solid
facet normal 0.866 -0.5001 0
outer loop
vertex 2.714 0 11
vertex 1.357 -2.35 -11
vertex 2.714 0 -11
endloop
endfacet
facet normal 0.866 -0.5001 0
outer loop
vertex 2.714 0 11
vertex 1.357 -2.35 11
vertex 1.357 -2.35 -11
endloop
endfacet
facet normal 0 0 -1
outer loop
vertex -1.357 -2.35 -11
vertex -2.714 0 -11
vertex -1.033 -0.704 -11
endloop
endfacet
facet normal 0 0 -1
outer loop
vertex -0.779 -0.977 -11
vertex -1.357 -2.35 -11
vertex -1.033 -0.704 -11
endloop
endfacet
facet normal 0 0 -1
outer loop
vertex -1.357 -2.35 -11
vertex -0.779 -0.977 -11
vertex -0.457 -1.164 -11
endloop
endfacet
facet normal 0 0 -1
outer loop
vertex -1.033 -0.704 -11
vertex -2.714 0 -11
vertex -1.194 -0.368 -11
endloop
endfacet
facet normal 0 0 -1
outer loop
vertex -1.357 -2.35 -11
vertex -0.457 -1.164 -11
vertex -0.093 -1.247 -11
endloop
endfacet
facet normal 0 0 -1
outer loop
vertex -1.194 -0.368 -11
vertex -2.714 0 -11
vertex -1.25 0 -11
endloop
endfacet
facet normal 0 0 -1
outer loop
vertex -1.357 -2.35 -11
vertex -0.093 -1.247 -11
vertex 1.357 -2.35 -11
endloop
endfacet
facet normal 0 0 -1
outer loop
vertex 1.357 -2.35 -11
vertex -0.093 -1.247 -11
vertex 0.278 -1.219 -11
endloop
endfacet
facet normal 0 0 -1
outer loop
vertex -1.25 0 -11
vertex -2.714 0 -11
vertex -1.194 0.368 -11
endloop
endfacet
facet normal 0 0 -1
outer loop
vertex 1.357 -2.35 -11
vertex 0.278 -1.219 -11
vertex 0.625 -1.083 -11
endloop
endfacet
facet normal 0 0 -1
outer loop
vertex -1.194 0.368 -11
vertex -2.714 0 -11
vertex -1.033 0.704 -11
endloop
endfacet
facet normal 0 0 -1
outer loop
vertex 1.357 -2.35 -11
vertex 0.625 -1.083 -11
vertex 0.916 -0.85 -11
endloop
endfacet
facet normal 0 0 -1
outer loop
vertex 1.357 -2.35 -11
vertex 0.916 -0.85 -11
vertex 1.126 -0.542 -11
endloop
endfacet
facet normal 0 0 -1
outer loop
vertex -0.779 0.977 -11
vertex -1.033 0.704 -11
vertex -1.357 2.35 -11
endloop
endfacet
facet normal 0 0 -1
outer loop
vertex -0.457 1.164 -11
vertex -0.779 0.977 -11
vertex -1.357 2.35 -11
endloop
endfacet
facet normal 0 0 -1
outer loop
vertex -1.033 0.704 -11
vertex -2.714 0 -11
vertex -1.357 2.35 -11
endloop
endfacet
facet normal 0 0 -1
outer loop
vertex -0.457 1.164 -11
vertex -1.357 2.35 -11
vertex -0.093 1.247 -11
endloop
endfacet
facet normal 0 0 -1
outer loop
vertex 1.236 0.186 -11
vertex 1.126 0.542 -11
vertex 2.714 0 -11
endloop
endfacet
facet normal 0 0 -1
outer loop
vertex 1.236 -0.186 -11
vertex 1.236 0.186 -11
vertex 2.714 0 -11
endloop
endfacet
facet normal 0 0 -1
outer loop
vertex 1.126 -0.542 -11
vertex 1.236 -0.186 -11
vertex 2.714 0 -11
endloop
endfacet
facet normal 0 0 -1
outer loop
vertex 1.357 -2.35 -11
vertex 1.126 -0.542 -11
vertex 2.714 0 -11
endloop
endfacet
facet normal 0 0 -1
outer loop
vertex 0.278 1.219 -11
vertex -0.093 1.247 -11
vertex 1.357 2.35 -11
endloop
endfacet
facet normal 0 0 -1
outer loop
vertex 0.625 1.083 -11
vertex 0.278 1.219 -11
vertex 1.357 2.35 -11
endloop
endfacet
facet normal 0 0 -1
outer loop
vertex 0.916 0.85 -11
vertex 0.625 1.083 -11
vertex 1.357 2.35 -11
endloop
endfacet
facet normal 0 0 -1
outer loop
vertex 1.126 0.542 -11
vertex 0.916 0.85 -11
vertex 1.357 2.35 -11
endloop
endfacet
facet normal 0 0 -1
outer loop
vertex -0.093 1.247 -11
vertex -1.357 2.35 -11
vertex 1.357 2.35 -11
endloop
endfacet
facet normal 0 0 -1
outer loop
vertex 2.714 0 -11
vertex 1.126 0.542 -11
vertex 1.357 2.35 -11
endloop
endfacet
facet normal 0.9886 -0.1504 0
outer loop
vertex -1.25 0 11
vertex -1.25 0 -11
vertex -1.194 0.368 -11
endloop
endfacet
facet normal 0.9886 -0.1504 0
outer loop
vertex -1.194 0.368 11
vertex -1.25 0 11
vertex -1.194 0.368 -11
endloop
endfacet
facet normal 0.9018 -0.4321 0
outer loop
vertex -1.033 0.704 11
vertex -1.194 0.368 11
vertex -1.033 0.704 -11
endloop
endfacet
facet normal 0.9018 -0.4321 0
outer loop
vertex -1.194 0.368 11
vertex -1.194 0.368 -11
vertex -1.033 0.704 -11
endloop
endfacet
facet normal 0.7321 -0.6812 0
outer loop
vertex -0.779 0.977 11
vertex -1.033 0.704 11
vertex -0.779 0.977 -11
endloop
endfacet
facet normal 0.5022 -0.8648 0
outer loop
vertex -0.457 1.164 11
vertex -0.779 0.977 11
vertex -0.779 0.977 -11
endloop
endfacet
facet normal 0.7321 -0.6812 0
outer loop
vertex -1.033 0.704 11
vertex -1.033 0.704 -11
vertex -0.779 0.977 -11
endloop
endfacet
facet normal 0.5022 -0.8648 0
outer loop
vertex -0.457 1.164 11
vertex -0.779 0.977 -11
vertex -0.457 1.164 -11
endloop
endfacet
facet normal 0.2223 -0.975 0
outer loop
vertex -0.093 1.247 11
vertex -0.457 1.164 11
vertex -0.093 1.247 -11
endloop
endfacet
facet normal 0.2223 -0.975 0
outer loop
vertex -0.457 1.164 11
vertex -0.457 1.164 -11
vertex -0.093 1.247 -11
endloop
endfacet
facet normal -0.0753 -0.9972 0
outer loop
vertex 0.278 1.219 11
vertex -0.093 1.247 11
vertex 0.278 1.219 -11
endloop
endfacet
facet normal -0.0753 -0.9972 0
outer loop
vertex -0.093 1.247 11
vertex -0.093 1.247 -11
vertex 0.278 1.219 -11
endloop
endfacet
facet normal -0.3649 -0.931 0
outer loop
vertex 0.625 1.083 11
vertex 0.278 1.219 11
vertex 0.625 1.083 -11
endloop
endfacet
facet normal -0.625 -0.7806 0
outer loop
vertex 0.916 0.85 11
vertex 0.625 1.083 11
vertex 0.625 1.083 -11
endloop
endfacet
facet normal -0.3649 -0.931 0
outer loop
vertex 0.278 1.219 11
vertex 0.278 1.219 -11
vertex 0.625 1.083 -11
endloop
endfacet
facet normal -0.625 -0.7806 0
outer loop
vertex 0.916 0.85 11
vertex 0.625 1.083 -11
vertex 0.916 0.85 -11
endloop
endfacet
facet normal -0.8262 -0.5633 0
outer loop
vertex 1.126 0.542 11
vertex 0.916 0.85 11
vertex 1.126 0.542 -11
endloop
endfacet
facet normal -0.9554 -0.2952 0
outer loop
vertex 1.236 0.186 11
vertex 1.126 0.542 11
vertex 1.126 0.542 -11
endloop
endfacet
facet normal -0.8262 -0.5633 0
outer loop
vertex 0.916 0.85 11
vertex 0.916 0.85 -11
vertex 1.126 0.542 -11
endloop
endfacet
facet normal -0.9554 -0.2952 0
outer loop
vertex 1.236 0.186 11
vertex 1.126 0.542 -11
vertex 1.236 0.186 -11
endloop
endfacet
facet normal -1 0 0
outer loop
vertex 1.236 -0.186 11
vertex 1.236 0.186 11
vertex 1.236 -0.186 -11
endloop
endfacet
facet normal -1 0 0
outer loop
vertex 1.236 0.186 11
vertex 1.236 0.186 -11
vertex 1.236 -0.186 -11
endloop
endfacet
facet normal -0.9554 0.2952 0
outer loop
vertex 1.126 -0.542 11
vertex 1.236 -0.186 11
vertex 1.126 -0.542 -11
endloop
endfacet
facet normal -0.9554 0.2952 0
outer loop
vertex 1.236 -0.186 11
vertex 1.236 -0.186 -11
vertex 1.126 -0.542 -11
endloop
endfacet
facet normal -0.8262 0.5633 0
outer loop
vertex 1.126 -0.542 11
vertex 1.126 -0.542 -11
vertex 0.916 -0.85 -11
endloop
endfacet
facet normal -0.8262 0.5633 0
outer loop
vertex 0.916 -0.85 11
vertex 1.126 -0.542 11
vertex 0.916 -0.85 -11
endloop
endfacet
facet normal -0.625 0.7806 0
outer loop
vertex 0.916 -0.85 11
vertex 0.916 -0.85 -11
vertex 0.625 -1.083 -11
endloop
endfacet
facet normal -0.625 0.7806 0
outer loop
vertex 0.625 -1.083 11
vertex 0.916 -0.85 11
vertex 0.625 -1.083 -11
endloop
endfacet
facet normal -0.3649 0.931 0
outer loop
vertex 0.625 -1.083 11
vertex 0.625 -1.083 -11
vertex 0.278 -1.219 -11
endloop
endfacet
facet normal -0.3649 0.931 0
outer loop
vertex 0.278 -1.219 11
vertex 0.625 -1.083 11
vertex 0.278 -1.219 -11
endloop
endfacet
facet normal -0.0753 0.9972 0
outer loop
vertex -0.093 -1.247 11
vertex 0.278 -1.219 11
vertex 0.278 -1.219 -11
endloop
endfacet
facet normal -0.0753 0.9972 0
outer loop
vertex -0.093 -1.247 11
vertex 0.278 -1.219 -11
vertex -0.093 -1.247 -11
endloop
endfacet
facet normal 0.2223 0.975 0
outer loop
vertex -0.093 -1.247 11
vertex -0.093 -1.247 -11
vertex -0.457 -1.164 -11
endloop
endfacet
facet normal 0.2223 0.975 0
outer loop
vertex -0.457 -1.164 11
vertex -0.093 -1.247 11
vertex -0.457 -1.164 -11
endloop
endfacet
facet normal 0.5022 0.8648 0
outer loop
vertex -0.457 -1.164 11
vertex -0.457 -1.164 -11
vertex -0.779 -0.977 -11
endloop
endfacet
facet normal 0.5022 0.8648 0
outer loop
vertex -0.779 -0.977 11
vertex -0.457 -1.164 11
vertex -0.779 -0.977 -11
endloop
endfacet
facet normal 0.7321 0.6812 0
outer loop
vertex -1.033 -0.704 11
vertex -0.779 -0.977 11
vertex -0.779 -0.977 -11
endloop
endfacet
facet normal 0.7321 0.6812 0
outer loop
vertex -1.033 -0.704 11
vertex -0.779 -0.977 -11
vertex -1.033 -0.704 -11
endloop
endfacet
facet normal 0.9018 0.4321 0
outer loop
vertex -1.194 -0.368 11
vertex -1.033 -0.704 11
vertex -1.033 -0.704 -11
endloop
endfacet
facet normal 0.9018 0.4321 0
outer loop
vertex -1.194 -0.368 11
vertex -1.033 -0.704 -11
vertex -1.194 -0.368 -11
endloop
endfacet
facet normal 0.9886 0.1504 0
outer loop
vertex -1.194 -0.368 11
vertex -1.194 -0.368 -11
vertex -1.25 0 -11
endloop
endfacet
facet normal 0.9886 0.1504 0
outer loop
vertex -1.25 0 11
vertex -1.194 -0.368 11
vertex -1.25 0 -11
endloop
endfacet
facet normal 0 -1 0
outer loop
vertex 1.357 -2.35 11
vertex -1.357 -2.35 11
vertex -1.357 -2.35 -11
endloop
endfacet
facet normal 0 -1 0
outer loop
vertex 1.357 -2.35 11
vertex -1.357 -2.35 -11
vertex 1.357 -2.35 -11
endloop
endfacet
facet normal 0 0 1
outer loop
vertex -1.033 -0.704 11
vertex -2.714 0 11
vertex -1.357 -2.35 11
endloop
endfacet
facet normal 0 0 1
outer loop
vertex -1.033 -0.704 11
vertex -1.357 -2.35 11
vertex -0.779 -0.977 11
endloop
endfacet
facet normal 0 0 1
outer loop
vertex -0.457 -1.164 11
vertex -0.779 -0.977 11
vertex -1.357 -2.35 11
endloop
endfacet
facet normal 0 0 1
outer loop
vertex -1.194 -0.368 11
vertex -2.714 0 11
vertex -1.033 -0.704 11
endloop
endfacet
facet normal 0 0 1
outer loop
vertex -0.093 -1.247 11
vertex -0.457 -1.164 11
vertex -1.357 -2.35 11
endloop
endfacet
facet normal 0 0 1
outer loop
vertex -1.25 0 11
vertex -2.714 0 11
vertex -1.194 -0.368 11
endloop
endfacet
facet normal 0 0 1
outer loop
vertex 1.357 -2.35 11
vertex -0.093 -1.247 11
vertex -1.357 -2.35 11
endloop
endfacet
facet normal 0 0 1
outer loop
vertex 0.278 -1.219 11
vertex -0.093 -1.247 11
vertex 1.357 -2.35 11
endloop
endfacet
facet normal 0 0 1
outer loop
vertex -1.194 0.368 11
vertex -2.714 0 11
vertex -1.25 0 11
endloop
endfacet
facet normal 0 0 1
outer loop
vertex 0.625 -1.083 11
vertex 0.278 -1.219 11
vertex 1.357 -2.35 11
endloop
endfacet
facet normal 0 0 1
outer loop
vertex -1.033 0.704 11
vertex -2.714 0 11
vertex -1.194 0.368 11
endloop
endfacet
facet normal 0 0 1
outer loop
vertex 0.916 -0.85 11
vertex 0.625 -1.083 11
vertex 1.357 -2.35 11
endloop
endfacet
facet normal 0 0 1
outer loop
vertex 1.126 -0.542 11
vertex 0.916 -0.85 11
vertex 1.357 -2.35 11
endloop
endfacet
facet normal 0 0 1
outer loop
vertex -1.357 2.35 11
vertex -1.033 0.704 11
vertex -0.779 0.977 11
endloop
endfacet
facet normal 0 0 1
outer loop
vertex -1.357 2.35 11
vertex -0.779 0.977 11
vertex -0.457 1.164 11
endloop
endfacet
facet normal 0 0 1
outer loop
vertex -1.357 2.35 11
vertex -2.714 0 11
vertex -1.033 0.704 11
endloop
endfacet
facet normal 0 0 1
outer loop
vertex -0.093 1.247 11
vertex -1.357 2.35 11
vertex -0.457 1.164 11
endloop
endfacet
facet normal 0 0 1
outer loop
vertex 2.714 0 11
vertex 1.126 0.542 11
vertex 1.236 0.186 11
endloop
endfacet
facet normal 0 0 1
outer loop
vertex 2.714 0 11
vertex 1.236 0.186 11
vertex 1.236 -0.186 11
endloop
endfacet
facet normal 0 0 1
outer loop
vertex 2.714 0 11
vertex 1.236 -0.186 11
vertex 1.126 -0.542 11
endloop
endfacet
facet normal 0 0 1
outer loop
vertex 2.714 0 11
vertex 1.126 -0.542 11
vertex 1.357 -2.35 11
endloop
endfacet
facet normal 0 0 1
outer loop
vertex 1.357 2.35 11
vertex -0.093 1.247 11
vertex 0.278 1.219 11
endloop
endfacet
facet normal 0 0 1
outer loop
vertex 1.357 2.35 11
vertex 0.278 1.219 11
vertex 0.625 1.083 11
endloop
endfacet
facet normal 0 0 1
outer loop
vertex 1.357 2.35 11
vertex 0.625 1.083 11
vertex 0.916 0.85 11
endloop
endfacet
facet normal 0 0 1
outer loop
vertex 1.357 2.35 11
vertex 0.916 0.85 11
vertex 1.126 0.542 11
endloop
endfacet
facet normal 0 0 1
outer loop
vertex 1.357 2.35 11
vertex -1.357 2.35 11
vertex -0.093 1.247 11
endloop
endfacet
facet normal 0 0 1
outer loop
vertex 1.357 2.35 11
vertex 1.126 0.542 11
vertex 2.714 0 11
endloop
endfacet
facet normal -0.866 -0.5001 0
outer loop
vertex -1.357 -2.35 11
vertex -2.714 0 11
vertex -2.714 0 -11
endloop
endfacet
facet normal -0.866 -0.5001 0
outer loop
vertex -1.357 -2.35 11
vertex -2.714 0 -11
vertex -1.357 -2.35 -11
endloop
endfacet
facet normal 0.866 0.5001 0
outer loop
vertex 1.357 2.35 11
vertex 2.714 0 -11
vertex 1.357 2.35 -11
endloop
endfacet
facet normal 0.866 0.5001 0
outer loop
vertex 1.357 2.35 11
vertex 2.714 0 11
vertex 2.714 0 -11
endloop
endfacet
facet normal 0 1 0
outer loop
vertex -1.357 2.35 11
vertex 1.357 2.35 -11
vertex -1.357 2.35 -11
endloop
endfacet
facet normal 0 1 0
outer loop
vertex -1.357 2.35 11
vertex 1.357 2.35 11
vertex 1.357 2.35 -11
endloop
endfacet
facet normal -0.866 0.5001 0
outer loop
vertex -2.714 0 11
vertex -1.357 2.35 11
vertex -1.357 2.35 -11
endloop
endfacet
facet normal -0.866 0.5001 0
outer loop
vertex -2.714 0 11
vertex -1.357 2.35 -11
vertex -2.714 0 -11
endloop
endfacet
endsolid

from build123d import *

# Parameters (mm, degrees)
EXTRUDE_1_DEPTH    = 11
HOLE_WIZARD_M3_1_D = 2.5


with BuildPart() as part:
    # 草图1 → 凸台-拉伸1 (new body, symmetric)
    with BuildSketch(Plane.XY):
        Polygon((1.356773133, 2.35), (-1.356773133, 2.35), (-2.713546265, 0), (-1.356773133, -2.35), (1.356773133, -2.35), (2.713546265, 0), align=None)
    extrude(amount=EXTRUDE_1_DEPTH, both=True)

    # M3 螺纹孔1 (through all)
    with Locations(Plane.XY.offset(11)):
        with Locations((0, 0)):
            Hole(HOLE_WIZARD_M3_1_D / 2)


solid = part.part
